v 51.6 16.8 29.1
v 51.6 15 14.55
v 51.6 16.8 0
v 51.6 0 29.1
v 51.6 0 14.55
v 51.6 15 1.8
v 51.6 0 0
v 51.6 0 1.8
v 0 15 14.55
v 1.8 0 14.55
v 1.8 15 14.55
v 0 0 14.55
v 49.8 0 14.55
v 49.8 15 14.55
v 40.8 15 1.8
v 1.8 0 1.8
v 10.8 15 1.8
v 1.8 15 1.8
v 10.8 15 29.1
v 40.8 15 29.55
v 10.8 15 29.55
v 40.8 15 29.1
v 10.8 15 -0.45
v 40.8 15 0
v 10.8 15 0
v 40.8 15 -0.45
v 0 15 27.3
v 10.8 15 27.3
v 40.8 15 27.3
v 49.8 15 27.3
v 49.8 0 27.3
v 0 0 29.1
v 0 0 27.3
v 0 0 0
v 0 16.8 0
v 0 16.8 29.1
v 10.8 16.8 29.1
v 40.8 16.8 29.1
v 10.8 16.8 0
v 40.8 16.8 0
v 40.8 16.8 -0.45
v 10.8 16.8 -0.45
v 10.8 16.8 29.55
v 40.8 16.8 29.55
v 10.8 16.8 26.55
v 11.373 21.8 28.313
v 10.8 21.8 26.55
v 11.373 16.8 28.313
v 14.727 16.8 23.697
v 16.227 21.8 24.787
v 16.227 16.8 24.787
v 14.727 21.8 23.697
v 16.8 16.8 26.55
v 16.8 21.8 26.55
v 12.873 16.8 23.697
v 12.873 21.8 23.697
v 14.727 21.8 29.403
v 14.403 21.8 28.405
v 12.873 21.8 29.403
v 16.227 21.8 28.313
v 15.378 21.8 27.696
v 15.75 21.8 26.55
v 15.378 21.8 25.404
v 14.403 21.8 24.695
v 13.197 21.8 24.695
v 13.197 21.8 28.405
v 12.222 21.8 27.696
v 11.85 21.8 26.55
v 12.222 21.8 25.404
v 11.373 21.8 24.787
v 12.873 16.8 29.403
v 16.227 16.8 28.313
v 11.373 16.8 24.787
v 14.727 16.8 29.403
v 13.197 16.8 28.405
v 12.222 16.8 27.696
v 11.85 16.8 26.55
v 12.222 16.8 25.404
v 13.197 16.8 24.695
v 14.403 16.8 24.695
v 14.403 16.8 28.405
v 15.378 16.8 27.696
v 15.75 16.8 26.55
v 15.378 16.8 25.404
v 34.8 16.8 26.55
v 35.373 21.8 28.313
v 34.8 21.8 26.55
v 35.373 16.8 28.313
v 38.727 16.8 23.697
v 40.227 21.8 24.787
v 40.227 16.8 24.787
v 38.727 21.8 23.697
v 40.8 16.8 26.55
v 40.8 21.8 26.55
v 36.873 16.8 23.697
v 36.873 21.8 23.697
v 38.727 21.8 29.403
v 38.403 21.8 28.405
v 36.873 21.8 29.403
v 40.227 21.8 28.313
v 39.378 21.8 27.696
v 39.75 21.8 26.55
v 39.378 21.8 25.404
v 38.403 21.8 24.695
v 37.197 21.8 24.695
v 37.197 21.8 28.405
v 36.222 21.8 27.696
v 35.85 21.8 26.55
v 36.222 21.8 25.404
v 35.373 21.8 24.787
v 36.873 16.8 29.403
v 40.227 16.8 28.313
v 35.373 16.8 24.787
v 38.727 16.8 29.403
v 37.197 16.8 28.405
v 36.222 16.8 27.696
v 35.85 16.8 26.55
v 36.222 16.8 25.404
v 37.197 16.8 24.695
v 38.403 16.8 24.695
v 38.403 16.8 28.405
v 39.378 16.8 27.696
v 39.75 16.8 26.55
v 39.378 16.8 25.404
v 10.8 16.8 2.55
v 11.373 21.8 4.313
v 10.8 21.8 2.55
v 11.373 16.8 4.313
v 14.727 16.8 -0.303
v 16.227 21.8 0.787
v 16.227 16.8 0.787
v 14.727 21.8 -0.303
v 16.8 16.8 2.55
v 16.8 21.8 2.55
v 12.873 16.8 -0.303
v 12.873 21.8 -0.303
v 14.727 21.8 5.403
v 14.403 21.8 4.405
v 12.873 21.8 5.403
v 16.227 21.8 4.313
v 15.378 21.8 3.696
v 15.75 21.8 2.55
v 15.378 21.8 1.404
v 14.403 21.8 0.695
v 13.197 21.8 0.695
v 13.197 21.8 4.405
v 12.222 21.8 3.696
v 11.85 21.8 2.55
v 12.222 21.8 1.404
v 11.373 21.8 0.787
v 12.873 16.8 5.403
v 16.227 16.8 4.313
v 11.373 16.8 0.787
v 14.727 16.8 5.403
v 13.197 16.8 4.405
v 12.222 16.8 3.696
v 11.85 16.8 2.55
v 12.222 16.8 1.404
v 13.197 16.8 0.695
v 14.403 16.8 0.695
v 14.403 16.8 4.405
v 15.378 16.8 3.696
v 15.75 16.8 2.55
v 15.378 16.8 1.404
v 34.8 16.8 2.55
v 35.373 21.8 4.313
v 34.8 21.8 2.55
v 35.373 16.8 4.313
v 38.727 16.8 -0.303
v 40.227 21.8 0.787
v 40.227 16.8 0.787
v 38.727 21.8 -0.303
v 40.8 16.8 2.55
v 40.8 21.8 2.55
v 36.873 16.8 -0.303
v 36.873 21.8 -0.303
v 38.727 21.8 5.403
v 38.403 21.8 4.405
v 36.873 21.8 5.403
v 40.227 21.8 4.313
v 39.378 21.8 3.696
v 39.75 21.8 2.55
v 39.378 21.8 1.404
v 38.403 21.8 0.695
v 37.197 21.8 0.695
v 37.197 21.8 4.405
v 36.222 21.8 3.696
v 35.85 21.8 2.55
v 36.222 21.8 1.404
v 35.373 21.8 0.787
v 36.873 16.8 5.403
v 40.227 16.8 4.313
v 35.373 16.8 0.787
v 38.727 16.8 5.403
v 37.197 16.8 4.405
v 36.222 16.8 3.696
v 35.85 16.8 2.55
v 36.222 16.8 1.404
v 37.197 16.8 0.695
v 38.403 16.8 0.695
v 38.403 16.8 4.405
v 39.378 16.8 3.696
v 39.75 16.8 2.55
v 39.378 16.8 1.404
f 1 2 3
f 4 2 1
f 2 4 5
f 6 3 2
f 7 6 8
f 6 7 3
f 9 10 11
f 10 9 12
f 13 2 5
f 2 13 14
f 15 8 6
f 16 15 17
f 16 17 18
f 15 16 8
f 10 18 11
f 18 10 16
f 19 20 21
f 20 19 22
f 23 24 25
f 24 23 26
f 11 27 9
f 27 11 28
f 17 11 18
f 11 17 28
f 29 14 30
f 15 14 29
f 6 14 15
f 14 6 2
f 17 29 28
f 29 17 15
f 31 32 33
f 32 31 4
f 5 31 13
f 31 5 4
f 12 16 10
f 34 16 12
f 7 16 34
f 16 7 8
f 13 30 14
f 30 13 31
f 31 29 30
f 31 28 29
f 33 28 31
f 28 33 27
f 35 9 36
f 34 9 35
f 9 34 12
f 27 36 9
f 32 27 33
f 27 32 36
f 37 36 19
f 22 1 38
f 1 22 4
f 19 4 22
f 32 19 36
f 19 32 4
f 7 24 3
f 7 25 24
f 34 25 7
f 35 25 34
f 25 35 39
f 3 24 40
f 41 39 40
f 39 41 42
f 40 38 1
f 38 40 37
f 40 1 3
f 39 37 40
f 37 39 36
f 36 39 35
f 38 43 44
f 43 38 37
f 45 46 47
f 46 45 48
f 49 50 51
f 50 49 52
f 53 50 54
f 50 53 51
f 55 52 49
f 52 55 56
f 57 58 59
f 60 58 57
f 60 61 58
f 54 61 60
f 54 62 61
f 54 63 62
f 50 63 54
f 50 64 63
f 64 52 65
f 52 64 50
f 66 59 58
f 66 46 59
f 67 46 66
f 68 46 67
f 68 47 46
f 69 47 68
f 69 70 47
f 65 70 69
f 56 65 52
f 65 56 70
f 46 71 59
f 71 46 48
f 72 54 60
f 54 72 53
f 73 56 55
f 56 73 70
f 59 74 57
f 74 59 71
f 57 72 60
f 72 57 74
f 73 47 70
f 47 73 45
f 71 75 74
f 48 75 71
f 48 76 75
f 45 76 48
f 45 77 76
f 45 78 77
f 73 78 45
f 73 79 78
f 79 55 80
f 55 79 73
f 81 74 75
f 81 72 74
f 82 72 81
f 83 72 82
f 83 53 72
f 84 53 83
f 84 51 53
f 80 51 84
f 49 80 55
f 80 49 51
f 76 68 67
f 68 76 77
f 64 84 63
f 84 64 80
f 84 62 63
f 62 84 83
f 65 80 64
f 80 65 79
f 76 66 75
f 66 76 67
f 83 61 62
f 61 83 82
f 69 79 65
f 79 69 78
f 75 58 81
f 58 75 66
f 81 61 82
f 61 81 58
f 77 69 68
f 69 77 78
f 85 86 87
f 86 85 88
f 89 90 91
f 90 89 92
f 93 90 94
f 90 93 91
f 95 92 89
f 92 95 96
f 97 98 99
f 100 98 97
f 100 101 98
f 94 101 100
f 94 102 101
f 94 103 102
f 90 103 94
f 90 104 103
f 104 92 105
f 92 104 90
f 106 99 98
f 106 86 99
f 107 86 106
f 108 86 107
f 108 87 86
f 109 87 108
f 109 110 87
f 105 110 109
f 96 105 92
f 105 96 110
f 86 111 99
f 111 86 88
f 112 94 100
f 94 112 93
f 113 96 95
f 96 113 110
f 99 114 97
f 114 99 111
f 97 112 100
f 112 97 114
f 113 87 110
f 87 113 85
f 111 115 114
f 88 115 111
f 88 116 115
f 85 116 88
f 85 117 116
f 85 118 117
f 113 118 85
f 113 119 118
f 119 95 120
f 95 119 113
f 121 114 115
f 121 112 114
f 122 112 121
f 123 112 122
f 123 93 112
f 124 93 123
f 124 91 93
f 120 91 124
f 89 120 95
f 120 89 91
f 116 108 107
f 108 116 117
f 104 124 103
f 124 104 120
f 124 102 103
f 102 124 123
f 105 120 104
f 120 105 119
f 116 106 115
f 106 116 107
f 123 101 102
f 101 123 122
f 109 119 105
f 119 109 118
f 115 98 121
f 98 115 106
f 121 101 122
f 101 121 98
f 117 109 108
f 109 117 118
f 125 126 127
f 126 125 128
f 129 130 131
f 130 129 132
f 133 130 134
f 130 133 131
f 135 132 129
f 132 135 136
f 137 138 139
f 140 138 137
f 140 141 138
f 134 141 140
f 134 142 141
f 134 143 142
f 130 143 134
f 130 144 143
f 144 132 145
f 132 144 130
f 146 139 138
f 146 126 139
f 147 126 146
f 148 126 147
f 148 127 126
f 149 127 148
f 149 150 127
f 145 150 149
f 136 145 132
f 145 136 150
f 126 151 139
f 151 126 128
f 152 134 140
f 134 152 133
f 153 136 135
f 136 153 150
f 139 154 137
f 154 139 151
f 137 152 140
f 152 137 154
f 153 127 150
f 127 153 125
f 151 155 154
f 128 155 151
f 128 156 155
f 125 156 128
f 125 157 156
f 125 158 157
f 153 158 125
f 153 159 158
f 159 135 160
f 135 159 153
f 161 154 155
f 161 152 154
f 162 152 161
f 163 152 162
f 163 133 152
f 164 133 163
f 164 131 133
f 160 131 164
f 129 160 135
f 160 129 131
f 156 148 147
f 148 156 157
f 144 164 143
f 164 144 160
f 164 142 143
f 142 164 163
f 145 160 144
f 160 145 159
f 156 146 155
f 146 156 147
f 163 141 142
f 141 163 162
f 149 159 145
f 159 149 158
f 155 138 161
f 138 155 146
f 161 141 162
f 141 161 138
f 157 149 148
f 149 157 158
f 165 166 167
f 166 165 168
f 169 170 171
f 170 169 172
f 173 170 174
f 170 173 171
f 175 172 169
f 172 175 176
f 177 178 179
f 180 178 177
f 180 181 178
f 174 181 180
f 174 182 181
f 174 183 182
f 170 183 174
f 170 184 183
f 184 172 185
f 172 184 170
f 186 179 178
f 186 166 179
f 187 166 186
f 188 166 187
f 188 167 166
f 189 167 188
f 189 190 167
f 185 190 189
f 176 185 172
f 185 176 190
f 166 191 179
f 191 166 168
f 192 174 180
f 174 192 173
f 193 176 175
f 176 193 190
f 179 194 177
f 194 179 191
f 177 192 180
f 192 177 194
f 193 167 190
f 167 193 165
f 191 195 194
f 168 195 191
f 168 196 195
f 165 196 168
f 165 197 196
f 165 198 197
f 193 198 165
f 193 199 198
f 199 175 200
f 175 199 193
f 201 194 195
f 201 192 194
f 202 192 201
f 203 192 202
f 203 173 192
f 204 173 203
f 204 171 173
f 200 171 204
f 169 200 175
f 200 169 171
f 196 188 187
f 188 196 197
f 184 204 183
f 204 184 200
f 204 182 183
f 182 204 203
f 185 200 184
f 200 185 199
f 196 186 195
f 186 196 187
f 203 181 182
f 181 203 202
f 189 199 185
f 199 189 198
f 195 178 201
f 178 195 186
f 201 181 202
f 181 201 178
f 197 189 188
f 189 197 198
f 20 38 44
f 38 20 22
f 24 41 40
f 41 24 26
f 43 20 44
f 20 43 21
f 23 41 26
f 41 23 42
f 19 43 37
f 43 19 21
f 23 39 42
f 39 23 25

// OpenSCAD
// Generated by SolidPython <Unknown> on 2020-12-22 20:26:49
$fn = 10;


union() {
	difference() {
		cube(size = [51.6000000000, 16.8000000000, 29.1000000000]);
		translate(v = [0, 0, 1.8000000000]) {
			union() {
				translate(v = [1.8000000000, 0, 0]) {
					cube(size = [49.8000000000, 15, 12.7500000000]);
				}
				translate(v = [0, 0, 12.7500000000]) {
					cube(size = [49.8000000000, 15, 12.7500000000]);
				}
			}
		}
	}
	translate(v = [10.8000000000, 15.0000000000, -0.4500000000]) {
		cube(size = [30, 1.8000000000, 30]);
	}
	translate(v = [-12.0000000000, 0, 0]) {
		translate(v = [0, 0, 12.0000000000]) {
			translate(v = [25.8, 16.8, 14.55]) {
				difference() {
					rotate(a = 90, v = [-1, 0, 0]) {
						cylinder(h = 5, r = 3);
					}
					rotate(a = 90, v = [-1, 0, 0]) {
						cylinder(h = 5, r = 1.9500000000);
					}
				}
			}
		}
	}
	translate(v = [12.0000000000, 0, 0]) {
		translate(v = [0, 0, 12.0000000000]) {
			translate(v = [25.8, 16.8, 14.55]) {
				difference() {
					rotate(a = 90, v = [-1, 0, 0]) {
						cylinder(h = 5, r = 3);
					}
					rotate(a = 90, v = [-1, 0, 0]) {
						cylinder(h = 5, r = 1.9500000000);
					}
				}
			}
		}
	}
	translate(v = [-12.0000000000, 0, 0]) {
		translate(v = [0, 0, -12.0000000000]) {
			translate(v = [25.8, 16.8, 14.55]) {
				difference() {
					rotate(a = 90, v = [-1, 0, 0]) {
						cylinder(h = 5, r = 3);
					}
					rotate(a = 90, v = [-1, 0, 0]) {
						cylinder(h = 5, r = 1.9500000000);
					}
				}
			}
		}
	}
	translate(v = [12.0000000000, 0, 0]) {
		translate(v = [0, 0, -12.0000000000]) {
			translate(v = [25.8, 16.8, 14.55]) {
				difference() {
					rotate(a = 90, v = [-1, 0, 0]) {
						cylinder(h = 5, r = 3);
					}
					rotate(a = 90, v = [-1, 0, 0]) {
						cylinder(h = 5, r = 1.9500000000);
					}
				}
			}
		}
	}
}
/***********************************************
*********      SolidPython code:      **********
************************************************
 
import random
from enum import Enum

from solid import *
from solid.partitioning import get_all_partitions, render_colored, render_uncolored
from solid.utils import *

fast_render = True

# Matek board
strength = 1.8
hole_distance = 24
hole_radius = 1.25
nut_inlay_radius_outer = 3
nut_inlay_radius_inner = 3.9 / 2
board_size = hole_distance + nut_inlay_radius_outer * 2

# Receiver
receiver_x = 48
receiver_y = 15
receiver_z = 25.5

receiver_cutout = union()(
    cube((receiver_x + strength, receiver_y, receiver_z / 2)).move_right(strength),
    cube([receiver_x + strength, receiver_y, receiver_z / 2]).move_up(receiver_z / 2)
)

receiver_clamp = difference()(
    cube((receiver_x + strength * 2, receiver_y + strength, receiver_z + strength * 2)),
    receiver_cutout().move_up(strength),
)

nut_inlay = difference()(
        cylinder(nut_inlay_radius_outer, 5).rotate(90, LEFT_VEC),
        cylinder(nut_inlay_radius_inner, 5).rotate(90, LEFT_VEC)
      ) \
    .center_behind(receiver_clamp, self_point_relative=(.5, 0, .5))

frame = receiver_clamp() \
    + cube((board_size, strength, board_size)).center_behind(receiver_clamp, (.5, 1, .5)) \
    + nut_inlay.move_up(hole_distance / 2).move_left(hole_distance / 2) \
    + nut_inlay.move_up(hole_distance / 2).move_right(hole_distance / 2) \
    + nut_inlay.move_down(hole_distance / 2).move_left(hole_distance / 2) \
    + nut_inlay.move_down(hole_distance / 2).move_right(hole_distance / 2)

spacer = cylinder(3.2/2.0, 5.8) - cylinder(2.4/2, 5.8)


scad_render_to_file(frame, 'tt_matek_frame.scad',
                    file_header=f'$fn = {"10" if fast_render else "100"};')
 
 
************************************************/
